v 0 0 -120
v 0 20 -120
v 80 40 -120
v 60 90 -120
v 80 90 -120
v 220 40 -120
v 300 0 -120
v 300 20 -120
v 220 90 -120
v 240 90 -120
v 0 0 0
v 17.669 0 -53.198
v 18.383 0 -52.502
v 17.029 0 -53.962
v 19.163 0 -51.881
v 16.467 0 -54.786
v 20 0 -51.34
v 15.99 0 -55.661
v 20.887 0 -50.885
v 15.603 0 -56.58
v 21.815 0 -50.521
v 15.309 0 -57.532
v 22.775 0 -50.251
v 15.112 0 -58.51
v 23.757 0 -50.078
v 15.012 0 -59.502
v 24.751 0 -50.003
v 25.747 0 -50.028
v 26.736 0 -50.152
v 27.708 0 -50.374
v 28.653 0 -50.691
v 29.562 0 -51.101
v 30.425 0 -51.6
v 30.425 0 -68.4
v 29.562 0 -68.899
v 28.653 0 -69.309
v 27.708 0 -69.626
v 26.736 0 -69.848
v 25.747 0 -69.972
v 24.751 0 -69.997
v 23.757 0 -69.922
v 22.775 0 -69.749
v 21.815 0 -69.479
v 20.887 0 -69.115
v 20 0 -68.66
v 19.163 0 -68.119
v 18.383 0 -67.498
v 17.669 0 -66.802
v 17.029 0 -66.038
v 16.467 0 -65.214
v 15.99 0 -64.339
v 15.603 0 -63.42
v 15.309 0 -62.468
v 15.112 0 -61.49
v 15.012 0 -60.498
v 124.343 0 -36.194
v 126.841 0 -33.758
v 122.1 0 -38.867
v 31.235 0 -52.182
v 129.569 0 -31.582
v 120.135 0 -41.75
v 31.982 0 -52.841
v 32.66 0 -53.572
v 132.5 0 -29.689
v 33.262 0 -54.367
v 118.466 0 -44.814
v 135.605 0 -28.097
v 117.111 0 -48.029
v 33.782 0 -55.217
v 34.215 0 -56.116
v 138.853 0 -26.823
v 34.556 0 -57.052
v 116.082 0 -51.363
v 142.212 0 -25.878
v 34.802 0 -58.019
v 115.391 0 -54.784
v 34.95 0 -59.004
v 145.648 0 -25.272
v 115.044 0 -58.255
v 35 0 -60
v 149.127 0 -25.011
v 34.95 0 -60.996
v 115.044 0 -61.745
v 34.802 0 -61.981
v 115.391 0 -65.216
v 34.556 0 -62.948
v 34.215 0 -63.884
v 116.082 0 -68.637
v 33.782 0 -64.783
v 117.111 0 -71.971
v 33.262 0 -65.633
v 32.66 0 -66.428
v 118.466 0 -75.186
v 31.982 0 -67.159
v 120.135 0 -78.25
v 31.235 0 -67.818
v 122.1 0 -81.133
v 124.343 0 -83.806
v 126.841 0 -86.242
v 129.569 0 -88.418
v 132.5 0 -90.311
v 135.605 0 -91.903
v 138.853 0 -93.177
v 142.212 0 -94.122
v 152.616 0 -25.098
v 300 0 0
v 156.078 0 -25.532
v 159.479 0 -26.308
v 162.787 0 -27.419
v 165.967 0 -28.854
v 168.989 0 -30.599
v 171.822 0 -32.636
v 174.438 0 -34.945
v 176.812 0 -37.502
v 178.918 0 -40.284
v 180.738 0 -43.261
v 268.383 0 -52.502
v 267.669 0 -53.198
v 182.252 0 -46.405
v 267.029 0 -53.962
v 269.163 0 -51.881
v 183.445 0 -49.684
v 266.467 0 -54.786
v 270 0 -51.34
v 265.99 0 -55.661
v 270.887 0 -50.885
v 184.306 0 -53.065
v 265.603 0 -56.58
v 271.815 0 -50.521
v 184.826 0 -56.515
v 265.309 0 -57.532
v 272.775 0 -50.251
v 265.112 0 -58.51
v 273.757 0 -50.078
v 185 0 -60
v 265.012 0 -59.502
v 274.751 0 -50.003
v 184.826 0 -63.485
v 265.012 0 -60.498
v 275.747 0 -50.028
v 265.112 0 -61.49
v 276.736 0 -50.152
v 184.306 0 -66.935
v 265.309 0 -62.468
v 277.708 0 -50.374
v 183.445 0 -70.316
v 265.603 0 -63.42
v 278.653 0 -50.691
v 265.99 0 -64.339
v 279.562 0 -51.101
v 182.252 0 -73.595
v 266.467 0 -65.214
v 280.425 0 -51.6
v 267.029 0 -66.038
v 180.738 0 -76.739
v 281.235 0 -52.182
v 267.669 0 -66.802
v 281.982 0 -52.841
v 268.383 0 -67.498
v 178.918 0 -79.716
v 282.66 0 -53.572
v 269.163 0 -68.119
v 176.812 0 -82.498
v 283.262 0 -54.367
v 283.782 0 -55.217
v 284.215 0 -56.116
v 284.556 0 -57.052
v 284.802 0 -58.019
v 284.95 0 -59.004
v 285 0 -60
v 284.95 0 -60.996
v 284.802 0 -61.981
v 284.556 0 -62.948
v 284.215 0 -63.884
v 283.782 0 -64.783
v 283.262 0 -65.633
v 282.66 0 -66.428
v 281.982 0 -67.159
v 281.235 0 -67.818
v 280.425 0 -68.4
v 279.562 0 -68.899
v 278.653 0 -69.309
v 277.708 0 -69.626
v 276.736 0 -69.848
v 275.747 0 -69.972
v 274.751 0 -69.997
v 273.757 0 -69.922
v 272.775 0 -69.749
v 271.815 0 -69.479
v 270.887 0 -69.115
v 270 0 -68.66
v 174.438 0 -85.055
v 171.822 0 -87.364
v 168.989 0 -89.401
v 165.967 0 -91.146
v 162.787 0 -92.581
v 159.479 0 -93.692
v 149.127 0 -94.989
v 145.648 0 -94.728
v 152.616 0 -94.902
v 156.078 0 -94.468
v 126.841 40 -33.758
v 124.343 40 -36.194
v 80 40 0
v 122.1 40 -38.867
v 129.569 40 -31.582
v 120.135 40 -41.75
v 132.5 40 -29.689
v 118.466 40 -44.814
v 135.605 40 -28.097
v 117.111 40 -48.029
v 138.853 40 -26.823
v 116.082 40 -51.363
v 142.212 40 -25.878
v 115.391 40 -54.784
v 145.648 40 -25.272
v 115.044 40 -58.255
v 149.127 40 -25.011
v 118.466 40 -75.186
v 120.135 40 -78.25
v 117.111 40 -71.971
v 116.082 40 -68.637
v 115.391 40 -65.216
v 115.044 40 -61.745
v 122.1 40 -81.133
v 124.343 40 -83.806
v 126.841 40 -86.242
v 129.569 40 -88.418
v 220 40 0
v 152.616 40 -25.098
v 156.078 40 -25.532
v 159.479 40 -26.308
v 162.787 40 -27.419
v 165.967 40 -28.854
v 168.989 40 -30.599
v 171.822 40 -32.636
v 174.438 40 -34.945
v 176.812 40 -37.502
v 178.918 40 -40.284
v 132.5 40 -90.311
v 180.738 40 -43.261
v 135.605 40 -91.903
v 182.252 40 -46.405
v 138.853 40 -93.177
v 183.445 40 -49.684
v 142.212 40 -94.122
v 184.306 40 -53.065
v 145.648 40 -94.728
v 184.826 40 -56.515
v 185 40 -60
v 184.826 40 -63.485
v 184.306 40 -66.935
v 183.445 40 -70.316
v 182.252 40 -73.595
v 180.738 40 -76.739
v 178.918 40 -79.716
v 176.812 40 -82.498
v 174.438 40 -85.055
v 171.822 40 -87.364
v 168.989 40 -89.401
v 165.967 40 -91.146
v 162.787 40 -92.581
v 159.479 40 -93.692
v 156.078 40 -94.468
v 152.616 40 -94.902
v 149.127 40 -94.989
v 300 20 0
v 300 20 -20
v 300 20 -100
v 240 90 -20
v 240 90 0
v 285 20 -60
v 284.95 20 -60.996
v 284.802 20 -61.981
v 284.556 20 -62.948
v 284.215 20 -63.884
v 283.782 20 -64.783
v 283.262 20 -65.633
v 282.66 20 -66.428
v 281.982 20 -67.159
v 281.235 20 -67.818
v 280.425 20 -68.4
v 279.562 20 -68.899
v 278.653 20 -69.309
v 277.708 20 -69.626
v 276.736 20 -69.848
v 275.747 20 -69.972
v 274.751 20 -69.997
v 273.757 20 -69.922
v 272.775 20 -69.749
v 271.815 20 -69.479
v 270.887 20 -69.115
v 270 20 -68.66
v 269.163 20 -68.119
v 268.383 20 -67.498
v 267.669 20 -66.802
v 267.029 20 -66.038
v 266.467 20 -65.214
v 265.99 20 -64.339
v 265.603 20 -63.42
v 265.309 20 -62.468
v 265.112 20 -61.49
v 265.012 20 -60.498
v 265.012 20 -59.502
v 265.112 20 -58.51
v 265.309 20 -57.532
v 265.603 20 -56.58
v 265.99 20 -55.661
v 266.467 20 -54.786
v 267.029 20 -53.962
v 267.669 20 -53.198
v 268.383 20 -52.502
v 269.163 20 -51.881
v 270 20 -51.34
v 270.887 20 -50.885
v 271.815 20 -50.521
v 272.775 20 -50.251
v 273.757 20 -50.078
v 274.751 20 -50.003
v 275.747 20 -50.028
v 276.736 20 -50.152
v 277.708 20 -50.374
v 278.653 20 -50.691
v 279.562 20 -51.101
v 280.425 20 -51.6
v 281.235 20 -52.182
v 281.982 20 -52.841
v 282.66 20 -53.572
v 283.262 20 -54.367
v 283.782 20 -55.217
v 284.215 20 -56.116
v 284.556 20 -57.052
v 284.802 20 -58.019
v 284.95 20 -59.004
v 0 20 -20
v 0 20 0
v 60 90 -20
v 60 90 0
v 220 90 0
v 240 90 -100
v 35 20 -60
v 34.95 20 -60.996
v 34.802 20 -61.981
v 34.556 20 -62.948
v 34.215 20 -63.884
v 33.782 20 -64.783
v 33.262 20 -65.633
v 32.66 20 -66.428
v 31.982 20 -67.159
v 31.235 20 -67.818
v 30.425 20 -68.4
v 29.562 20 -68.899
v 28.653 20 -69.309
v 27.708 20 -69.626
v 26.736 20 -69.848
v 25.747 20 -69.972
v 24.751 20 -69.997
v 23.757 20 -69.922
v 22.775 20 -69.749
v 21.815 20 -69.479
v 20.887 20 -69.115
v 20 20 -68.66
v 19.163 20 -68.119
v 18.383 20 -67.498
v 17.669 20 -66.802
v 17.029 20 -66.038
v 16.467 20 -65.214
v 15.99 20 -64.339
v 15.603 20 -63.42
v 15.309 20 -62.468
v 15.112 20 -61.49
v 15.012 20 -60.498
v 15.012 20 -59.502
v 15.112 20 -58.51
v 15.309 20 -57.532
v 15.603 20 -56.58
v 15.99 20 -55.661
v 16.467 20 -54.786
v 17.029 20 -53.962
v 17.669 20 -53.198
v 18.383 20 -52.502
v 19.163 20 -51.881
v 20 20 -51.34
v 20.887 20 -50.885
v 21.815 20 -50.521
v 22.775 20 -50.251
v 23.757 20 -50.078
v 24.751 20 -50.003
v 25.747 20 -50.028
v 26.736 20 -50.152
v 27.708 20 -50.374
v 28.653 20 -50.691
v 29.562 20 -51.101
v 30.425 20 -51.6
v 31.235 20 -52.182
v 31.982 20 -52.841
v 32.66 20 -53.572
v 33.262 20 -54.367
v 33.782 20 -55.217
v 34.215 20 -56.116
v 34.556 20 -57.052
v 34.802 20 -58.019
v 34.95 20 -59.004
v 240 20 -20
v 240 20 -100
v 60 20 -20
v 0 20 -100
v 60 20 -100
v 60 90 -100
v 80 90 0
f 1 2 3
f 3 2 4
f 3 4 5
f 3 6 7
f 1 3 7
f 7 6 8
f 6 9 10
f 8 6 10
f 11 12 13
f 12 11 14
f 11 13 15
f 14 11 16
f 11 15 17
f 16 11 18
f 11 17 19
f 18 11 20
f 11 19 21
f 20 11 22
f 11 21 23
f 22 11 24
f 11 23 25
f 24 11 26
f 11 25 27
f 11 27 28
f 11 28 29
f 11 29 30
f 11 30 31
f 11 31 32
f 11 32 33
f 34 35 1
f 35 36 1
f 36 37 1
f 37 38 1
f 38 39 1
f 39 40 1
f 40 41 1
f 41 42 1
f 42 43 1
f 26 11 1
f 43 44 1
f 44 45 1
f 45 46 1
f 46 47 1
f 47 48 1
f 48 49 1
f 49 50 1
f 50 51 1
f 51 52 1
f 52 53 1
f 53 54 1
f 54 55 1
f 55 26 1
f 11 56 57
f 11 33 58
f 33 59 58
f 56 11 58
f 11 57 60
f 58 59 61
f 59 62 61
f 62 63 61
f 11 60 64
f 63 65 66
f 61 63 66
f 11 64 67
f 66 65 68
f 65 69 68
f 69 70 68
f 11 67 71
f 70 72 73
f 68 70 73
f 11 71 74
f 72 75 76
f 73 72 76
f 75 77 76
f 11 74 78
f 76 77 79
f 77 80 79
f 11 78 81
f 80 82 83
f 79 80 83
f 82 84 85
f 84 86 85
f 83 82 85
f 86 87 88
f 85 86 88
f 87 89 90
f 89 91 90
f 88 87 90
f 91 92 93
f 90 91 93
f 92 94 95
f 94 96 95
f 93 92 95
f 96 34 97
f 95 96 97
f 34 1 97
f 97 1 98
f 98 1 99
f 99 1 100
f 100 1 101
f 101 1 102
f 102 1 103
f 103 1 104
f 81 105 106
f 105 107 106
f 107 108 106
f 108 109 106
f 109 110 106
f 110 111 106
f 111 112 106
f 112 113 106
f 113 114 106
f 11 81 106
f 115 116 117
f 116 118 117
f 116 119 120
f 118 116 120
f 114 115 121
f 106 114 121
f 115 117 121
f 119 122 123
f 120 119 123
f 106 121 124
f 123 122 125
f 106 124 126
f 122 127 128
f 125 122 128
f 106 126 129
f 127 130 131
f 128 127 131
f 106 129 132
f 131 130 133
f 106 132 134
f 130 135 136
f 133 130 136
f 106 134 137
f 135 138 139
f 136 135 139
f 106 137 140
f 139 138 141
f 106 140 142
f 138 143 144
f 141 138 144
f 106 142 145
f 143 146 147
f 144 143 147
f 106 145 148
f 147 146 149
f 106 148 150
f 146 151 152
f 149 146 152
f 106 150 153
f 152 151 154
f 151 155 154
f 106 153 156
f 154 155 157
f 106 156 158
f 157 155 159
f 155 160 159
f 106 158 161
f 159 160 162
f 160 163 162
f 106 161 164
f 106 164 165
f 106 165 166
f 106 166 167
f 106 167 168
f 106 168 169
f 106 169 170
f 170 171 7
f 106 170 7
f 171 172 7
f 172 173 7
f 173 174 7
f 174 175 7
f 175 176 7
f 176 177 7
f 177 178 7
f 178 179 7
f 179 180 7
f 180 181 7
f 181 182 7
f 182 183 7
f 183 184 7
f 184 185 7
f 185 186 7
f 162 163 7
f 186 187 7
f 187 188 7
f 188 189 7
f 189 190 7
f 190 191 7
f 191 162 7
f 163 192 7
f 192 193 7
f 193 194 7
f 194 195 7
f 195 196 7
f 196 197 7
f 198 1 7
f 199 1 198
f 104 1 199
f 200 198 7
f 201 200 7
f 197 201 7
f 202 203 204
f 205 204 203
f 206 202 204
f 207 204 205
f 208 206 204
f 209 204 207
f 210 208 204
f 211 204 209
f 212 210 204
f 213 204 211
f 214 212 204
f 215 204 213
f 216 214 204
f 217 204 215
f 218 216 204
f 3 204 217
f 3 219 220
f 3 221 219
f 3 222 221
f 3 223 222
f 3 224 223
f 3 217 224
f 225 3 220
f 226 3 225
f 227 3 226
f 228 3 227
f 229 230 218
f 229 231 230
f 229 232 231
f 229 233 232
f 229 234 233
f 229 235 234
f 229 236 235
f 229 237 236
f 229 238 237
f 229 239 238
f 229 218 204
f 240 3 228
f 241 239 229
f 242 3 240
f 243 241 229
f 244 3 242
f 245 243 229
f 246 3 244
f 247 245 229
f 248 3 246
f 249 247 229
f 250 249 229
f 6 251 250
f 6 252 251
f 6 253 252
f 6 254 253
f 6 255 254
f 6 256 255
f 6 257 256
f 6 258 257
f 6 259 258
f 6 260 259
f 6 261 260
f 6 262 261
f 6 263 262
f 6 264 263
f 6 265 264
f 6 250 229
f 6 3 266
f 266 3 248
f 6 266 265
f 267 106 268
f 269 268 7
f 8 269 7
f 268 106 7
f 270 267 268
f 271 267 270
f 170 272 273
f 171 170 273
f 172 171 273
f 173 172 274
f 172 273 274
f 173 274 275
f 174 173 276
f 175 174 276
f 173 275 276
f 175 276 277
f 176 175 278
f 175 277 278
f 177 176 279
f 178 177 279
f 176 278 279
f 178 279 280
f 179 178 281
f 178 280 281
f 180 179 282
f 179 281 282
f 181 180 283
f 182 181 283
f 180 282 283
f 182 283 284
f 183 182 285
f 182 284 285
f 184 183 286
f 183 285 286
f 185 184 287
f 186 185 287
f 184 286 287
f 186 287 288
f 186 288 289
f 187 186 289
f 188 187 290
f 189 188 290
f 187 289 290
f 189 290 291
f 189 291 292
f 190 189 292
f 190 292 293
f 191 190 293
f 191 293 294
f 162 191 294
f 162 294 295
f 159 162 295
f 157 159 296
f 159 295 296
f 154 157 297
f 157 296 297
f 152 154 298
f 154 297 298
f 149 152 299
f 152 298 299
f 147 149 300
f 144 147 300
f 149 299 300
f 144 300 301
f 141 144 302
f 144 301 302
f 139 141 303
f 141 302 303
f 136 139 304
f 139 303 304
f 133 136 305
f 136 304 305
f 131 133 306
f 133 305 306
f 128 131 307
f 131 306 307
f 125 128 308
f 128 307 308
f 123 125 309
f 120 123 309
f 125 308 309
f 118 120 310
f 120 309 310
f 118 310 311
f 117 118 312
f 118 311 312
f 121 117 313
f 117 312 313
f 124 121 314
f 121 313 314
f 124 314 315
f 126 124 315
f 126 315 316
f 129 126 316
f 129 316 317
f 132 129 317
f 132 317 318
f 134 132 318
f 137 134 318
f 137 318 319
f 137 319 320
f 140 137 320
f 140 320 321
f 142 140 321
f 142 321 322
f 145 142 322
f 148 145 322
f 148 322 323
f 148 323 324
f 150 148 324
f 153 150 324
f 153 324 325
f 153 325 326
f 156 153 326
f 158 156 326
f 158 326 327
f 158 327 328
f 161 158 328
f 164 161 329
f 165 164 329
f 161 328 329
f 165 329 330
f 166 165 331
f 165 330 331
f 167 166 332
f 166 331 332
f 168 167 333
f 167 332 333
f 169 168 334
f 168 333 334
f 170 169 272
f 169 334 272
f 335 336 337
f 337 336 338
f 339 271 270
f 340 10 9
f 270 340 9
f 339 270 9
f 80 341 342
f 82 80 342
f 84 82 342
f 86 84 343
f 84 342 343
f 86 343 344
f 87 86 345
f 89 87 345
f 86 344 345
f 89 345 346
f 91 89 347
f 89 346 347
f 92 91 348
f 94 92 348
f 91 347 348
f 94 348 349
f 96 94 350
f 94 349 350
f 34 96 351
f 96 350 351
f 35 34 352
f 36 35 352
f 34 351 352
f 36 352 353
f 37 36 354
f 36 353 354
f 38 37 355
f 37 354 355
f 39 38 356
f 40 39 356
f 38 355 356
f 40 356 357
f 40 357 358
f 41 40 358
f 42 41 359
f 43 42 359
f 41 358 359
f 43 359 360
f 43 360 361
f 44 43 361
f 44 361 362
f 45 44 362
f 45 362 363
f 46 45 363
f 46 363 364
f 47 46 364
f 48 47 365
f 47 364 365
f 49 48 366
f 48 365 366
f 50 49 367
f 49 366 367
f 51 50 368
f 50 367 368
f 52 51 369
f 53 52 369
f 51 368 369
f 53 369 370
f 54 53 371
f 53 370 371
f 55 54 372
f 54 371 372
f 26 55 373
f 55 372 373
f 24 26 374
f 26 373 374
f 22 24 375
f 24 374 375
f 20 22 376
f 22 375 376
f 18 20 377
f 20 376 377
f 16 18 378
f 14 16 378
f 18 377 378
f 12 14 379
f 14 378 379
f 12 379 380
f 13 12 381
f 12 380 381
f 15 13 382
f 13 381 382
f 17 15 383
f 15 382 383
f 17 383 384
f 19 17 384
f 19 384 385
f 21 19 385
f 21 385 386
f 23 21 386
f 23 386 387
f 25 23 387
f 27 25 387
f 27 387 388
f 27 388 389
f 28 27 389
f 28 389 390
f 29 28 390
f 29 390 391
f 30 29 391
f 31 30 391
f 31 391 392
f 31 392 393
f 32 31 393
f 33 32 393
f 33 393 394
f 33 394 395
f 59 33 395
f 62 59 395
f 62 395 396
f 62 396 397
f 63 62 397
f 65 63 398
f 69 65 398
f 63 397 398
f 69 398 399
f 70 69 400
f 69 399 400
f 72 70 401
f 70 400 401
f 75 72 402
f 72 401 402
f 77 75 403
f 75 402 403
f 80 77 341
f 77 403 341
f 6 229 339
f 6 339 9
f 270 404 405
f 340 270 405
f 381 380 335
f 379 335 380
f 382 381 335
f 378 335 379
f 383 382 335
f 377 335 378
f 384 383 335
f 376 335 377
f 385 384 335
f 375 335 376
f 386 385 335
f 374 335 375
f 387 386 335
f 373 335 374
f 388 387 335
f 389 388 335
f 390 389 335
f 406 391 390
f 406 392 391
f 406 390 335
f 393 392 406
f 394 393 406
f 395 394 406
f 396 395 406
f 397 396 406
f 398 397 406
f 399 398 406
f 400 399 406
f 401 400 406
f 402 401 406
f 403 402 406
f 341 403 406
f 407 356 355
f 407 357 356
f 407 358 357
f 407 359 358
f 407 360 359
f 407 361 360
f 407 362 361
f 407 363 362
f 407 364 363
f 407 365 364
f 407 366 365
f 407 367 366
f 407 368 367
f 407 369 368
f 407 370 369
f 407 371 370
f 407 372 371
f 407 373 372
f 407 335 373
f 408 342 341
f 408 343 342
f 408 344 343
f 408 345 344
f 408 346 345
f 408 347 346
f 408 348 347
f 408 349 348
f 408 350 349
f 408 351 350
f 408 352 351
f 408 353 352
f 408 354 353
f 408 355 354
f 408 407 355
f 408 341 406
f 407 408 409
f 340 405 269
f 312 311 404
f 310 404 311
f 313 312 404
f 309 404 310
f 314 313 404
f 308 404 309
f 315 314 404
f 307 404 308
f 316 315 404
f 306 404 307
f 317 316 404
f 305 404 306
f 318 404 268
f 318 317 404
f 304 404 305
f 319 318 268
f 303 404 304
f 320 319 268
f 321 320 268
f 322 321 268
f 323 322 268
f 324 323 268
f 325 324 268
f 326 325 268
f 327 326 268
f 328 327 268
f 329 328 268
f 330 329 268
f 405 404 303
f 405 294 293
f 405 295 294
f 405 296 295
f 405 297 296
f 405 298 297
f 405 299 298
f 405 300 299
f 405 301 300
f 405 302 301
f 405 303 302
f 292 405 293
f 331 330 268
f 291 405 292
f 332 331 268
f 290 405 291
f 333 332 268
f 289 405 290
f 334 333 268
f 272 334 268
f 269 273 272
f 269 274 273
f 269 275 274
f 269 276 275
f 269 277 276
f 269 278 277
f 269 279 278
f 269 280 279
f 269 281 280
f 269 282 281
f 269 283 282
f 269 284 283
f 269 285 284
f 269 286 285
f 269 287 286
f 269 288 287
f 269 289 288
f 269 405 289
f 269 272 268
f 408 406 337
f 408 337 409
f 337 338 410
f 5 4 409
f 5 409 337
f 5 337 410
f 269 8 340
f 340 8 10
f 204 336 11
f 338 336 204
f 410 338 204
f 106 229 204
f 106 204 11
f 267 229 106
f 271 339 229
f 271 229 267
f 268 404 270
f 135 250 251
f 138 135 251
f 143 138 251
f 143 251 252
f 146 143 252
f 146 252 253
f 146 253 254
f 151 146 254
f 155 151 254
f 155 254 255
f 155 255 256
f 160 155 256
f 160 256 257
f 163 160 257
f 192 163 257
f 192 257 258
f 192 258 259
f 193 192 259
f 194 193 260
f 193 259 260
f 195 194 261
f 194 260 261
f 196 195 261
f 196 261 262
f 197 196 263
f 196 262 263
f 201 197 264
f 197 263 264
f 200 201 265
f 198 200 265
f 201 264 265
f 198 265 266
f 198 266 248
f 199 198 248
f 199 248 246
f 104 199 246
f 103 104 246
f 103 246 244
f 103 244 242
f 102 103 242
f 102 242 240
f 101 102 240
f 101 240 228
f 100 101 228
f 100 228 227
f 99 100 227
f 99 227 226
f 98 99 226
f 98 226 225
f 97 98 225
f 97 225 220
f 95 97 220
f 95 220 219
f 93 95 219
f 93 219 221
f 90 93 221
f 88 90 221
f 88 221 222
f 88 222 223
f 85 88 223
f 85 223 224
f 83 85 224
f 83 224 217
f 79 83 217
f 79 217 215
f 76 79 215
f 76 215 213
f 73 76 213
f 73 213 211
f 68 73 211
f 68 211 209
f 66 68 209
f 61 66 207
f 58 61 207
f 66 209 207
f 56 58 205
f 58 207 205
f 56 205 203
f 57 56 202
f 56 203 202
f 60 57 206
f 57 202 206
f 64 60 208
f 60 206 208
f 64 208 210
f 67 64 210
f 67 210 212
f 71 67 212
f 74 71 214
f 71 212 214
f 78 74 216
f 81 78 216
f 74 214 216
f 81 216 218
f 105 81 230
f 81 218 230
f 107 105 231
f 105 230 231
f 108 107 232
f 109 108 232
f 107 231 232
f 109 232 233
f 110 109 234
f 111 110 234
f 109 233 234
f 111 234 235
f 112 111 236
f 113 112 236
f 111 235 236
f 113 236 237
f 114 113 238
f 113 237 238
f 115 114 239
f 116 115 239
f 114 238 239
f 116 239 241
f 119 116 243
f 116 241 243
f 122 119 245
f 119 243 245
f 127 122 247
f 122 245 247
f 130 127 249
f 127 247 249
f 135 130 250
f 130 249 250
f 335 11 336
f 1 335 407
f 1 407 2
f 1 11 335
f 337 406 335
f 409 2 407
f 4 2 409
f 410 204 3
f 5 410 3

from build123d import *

# Parameters (mm, degrees)
IZIM1_W                     = 300
IZIM1_H                     = 120
Y_KSEKLIK_EKSTR_ZYON1_DEPTH = 20
IZIM2_W                     = 20
IZIM2_H                     = 120
Y_KSEKLIK_EKSTR_ZYON2_DEPTH = 70
IZIM3_W                     = 140
IZIM3_H                     = 120
Y_KSEKLIK_EKSTR_ZYON3_DEPTH = 20
Y_KSEKLIK_EKSTR_ZYON4_DEPTH = 20
AYNALAMA3_COPY_1_DEPTH      = 20
IZIM5_R                     = 35
KES_EKSTR_ZYON1_DEPTH       = 51
KES_EKSTR_ZYON1_DEPTH_BACK  = 41
IZIM6_R                     = 10
KES_EKSTR_ZYON2_DEPTH       = 20


with BuildPart() as part:
    # Çizim1 → Yükseklik-Ekstrüzyon1 (new body)
    with BuildSketch(Plane(origin=(0, 0, 0), x_dir=(1, 0, 0), z_dir=(0, 1, 0))):
        with Locations((150, 60)):
            Rectangle(IZIM1_W, IZIM1_H)
    extrude(amount=Y_KSEKLIK_EKSTR_ZYON1_DEPTH)

    # Çizim2 → Yükseklik-Ekstrüzyon2 (add)
    with BuildSketch(Plane(origin=(0, 20, 0), x_dir=(1, 0, 0), z_dir=(0, 1, 0))):
        with Locations((70, 60)):
            Rectangle(IZIM2_W, IZIM2_H)
    y_kseklik_ekstr_zyon2 = extrude(amount=Y_KSEKLIK_EKSTR_ZYON2_DEPTH)

    # Aynalama1: Yükseklik-Ekstrüzyon2 across plane
    add(y_kseklik_ekstr_zyon2.mirror(Plane.ZY.offset(-150)))

    # Çizim3 → Yükseklik-Ekstrüzyon3 (add)
    with BuildSketch(Plane(origin=(0, 20, 0), x_dir=(1, 0, 0), z_dir=(0, 1, 0))):
        with Locations((150, 60)):
            Rectangle(IZIM3_W, IZIM3_H)
    extrude(amount=Y_KSEKLIK_EKSTR_ZYON3_DEPTH)

    # Çizim4 → Yükseklik-Ekstrüzyon4 (add)
    with BuildSketch(Plane.XY):
        Polygon((0, 20), (60, 90), (60, 20), align=None)
    y_kseklik_ekstr_zyon4 = extrude(amount=-Y_KSEKLIK_EKSTR_ZYON4_DEPTH)

    # Aynalama2: Yükseklik-Ekstrüzyon4 across plane
    add(y_kseklik_ekstr_zyon4.mirror(Plane.XY.offset(-60)))

    # Aynalama3: Yükseklik-Ekstrüzyon4 across plane
    add(y_kseklik_ekstr_zyon4.mirror(Plane.ZY.offset(-150)))

    # Aynalama3 copy 1 sketch → Aynalama3 copy 1 (add)
    with BuildSketch(Plane(origin=(300, 0, -120), x_dir=(-1, 0, 0), z_dir=(0, 0, -1))):
        Polygon((0, 20), (60, 90), (60, 20), align=None)
    extrude(amount=-AYNALAMA3_COPY_1_DEPTH)

    # Çizim5 → Kes-Ekstrüzyon1 (cut, two sides)
    with BuildSketch(Plane(origin=(0, 40, 0), x_dir=(1, 0, 0), z_dir=(0, 1, 0))) as kes_ekstr_zyon1_sk:
        with Locations((150, 60)):
            Circle(IZIM5_R)
    extrude(amount=KES_EKSTR_ZYON1_DEPTH, mode=Mode.SUBTRACT)
    extrude(kes_ekstr_zyon1_sk.sketch, amount=-KES_EKSTR_ZYON1_DEPTH_BACK, mode=Mode.SUBTRACT)

    # Çizim6 → Kes-Ekstrüzyon2 (cut)
    with BuildSketch(Plane(origin=(0, 20, 0), x_dir=(1, 0, 0), z_dir=(0, 1, 0))):
        with Locations((25, 60)):
            Circle(IZIM6_R)
        with Locations((275, 60)):
            Circle(IZIM6_R)
    extrude(amount=-KES_EKSTR_ZYON2_DEPTH, mode=Mode.SUBTRACT)


solid = part.part
